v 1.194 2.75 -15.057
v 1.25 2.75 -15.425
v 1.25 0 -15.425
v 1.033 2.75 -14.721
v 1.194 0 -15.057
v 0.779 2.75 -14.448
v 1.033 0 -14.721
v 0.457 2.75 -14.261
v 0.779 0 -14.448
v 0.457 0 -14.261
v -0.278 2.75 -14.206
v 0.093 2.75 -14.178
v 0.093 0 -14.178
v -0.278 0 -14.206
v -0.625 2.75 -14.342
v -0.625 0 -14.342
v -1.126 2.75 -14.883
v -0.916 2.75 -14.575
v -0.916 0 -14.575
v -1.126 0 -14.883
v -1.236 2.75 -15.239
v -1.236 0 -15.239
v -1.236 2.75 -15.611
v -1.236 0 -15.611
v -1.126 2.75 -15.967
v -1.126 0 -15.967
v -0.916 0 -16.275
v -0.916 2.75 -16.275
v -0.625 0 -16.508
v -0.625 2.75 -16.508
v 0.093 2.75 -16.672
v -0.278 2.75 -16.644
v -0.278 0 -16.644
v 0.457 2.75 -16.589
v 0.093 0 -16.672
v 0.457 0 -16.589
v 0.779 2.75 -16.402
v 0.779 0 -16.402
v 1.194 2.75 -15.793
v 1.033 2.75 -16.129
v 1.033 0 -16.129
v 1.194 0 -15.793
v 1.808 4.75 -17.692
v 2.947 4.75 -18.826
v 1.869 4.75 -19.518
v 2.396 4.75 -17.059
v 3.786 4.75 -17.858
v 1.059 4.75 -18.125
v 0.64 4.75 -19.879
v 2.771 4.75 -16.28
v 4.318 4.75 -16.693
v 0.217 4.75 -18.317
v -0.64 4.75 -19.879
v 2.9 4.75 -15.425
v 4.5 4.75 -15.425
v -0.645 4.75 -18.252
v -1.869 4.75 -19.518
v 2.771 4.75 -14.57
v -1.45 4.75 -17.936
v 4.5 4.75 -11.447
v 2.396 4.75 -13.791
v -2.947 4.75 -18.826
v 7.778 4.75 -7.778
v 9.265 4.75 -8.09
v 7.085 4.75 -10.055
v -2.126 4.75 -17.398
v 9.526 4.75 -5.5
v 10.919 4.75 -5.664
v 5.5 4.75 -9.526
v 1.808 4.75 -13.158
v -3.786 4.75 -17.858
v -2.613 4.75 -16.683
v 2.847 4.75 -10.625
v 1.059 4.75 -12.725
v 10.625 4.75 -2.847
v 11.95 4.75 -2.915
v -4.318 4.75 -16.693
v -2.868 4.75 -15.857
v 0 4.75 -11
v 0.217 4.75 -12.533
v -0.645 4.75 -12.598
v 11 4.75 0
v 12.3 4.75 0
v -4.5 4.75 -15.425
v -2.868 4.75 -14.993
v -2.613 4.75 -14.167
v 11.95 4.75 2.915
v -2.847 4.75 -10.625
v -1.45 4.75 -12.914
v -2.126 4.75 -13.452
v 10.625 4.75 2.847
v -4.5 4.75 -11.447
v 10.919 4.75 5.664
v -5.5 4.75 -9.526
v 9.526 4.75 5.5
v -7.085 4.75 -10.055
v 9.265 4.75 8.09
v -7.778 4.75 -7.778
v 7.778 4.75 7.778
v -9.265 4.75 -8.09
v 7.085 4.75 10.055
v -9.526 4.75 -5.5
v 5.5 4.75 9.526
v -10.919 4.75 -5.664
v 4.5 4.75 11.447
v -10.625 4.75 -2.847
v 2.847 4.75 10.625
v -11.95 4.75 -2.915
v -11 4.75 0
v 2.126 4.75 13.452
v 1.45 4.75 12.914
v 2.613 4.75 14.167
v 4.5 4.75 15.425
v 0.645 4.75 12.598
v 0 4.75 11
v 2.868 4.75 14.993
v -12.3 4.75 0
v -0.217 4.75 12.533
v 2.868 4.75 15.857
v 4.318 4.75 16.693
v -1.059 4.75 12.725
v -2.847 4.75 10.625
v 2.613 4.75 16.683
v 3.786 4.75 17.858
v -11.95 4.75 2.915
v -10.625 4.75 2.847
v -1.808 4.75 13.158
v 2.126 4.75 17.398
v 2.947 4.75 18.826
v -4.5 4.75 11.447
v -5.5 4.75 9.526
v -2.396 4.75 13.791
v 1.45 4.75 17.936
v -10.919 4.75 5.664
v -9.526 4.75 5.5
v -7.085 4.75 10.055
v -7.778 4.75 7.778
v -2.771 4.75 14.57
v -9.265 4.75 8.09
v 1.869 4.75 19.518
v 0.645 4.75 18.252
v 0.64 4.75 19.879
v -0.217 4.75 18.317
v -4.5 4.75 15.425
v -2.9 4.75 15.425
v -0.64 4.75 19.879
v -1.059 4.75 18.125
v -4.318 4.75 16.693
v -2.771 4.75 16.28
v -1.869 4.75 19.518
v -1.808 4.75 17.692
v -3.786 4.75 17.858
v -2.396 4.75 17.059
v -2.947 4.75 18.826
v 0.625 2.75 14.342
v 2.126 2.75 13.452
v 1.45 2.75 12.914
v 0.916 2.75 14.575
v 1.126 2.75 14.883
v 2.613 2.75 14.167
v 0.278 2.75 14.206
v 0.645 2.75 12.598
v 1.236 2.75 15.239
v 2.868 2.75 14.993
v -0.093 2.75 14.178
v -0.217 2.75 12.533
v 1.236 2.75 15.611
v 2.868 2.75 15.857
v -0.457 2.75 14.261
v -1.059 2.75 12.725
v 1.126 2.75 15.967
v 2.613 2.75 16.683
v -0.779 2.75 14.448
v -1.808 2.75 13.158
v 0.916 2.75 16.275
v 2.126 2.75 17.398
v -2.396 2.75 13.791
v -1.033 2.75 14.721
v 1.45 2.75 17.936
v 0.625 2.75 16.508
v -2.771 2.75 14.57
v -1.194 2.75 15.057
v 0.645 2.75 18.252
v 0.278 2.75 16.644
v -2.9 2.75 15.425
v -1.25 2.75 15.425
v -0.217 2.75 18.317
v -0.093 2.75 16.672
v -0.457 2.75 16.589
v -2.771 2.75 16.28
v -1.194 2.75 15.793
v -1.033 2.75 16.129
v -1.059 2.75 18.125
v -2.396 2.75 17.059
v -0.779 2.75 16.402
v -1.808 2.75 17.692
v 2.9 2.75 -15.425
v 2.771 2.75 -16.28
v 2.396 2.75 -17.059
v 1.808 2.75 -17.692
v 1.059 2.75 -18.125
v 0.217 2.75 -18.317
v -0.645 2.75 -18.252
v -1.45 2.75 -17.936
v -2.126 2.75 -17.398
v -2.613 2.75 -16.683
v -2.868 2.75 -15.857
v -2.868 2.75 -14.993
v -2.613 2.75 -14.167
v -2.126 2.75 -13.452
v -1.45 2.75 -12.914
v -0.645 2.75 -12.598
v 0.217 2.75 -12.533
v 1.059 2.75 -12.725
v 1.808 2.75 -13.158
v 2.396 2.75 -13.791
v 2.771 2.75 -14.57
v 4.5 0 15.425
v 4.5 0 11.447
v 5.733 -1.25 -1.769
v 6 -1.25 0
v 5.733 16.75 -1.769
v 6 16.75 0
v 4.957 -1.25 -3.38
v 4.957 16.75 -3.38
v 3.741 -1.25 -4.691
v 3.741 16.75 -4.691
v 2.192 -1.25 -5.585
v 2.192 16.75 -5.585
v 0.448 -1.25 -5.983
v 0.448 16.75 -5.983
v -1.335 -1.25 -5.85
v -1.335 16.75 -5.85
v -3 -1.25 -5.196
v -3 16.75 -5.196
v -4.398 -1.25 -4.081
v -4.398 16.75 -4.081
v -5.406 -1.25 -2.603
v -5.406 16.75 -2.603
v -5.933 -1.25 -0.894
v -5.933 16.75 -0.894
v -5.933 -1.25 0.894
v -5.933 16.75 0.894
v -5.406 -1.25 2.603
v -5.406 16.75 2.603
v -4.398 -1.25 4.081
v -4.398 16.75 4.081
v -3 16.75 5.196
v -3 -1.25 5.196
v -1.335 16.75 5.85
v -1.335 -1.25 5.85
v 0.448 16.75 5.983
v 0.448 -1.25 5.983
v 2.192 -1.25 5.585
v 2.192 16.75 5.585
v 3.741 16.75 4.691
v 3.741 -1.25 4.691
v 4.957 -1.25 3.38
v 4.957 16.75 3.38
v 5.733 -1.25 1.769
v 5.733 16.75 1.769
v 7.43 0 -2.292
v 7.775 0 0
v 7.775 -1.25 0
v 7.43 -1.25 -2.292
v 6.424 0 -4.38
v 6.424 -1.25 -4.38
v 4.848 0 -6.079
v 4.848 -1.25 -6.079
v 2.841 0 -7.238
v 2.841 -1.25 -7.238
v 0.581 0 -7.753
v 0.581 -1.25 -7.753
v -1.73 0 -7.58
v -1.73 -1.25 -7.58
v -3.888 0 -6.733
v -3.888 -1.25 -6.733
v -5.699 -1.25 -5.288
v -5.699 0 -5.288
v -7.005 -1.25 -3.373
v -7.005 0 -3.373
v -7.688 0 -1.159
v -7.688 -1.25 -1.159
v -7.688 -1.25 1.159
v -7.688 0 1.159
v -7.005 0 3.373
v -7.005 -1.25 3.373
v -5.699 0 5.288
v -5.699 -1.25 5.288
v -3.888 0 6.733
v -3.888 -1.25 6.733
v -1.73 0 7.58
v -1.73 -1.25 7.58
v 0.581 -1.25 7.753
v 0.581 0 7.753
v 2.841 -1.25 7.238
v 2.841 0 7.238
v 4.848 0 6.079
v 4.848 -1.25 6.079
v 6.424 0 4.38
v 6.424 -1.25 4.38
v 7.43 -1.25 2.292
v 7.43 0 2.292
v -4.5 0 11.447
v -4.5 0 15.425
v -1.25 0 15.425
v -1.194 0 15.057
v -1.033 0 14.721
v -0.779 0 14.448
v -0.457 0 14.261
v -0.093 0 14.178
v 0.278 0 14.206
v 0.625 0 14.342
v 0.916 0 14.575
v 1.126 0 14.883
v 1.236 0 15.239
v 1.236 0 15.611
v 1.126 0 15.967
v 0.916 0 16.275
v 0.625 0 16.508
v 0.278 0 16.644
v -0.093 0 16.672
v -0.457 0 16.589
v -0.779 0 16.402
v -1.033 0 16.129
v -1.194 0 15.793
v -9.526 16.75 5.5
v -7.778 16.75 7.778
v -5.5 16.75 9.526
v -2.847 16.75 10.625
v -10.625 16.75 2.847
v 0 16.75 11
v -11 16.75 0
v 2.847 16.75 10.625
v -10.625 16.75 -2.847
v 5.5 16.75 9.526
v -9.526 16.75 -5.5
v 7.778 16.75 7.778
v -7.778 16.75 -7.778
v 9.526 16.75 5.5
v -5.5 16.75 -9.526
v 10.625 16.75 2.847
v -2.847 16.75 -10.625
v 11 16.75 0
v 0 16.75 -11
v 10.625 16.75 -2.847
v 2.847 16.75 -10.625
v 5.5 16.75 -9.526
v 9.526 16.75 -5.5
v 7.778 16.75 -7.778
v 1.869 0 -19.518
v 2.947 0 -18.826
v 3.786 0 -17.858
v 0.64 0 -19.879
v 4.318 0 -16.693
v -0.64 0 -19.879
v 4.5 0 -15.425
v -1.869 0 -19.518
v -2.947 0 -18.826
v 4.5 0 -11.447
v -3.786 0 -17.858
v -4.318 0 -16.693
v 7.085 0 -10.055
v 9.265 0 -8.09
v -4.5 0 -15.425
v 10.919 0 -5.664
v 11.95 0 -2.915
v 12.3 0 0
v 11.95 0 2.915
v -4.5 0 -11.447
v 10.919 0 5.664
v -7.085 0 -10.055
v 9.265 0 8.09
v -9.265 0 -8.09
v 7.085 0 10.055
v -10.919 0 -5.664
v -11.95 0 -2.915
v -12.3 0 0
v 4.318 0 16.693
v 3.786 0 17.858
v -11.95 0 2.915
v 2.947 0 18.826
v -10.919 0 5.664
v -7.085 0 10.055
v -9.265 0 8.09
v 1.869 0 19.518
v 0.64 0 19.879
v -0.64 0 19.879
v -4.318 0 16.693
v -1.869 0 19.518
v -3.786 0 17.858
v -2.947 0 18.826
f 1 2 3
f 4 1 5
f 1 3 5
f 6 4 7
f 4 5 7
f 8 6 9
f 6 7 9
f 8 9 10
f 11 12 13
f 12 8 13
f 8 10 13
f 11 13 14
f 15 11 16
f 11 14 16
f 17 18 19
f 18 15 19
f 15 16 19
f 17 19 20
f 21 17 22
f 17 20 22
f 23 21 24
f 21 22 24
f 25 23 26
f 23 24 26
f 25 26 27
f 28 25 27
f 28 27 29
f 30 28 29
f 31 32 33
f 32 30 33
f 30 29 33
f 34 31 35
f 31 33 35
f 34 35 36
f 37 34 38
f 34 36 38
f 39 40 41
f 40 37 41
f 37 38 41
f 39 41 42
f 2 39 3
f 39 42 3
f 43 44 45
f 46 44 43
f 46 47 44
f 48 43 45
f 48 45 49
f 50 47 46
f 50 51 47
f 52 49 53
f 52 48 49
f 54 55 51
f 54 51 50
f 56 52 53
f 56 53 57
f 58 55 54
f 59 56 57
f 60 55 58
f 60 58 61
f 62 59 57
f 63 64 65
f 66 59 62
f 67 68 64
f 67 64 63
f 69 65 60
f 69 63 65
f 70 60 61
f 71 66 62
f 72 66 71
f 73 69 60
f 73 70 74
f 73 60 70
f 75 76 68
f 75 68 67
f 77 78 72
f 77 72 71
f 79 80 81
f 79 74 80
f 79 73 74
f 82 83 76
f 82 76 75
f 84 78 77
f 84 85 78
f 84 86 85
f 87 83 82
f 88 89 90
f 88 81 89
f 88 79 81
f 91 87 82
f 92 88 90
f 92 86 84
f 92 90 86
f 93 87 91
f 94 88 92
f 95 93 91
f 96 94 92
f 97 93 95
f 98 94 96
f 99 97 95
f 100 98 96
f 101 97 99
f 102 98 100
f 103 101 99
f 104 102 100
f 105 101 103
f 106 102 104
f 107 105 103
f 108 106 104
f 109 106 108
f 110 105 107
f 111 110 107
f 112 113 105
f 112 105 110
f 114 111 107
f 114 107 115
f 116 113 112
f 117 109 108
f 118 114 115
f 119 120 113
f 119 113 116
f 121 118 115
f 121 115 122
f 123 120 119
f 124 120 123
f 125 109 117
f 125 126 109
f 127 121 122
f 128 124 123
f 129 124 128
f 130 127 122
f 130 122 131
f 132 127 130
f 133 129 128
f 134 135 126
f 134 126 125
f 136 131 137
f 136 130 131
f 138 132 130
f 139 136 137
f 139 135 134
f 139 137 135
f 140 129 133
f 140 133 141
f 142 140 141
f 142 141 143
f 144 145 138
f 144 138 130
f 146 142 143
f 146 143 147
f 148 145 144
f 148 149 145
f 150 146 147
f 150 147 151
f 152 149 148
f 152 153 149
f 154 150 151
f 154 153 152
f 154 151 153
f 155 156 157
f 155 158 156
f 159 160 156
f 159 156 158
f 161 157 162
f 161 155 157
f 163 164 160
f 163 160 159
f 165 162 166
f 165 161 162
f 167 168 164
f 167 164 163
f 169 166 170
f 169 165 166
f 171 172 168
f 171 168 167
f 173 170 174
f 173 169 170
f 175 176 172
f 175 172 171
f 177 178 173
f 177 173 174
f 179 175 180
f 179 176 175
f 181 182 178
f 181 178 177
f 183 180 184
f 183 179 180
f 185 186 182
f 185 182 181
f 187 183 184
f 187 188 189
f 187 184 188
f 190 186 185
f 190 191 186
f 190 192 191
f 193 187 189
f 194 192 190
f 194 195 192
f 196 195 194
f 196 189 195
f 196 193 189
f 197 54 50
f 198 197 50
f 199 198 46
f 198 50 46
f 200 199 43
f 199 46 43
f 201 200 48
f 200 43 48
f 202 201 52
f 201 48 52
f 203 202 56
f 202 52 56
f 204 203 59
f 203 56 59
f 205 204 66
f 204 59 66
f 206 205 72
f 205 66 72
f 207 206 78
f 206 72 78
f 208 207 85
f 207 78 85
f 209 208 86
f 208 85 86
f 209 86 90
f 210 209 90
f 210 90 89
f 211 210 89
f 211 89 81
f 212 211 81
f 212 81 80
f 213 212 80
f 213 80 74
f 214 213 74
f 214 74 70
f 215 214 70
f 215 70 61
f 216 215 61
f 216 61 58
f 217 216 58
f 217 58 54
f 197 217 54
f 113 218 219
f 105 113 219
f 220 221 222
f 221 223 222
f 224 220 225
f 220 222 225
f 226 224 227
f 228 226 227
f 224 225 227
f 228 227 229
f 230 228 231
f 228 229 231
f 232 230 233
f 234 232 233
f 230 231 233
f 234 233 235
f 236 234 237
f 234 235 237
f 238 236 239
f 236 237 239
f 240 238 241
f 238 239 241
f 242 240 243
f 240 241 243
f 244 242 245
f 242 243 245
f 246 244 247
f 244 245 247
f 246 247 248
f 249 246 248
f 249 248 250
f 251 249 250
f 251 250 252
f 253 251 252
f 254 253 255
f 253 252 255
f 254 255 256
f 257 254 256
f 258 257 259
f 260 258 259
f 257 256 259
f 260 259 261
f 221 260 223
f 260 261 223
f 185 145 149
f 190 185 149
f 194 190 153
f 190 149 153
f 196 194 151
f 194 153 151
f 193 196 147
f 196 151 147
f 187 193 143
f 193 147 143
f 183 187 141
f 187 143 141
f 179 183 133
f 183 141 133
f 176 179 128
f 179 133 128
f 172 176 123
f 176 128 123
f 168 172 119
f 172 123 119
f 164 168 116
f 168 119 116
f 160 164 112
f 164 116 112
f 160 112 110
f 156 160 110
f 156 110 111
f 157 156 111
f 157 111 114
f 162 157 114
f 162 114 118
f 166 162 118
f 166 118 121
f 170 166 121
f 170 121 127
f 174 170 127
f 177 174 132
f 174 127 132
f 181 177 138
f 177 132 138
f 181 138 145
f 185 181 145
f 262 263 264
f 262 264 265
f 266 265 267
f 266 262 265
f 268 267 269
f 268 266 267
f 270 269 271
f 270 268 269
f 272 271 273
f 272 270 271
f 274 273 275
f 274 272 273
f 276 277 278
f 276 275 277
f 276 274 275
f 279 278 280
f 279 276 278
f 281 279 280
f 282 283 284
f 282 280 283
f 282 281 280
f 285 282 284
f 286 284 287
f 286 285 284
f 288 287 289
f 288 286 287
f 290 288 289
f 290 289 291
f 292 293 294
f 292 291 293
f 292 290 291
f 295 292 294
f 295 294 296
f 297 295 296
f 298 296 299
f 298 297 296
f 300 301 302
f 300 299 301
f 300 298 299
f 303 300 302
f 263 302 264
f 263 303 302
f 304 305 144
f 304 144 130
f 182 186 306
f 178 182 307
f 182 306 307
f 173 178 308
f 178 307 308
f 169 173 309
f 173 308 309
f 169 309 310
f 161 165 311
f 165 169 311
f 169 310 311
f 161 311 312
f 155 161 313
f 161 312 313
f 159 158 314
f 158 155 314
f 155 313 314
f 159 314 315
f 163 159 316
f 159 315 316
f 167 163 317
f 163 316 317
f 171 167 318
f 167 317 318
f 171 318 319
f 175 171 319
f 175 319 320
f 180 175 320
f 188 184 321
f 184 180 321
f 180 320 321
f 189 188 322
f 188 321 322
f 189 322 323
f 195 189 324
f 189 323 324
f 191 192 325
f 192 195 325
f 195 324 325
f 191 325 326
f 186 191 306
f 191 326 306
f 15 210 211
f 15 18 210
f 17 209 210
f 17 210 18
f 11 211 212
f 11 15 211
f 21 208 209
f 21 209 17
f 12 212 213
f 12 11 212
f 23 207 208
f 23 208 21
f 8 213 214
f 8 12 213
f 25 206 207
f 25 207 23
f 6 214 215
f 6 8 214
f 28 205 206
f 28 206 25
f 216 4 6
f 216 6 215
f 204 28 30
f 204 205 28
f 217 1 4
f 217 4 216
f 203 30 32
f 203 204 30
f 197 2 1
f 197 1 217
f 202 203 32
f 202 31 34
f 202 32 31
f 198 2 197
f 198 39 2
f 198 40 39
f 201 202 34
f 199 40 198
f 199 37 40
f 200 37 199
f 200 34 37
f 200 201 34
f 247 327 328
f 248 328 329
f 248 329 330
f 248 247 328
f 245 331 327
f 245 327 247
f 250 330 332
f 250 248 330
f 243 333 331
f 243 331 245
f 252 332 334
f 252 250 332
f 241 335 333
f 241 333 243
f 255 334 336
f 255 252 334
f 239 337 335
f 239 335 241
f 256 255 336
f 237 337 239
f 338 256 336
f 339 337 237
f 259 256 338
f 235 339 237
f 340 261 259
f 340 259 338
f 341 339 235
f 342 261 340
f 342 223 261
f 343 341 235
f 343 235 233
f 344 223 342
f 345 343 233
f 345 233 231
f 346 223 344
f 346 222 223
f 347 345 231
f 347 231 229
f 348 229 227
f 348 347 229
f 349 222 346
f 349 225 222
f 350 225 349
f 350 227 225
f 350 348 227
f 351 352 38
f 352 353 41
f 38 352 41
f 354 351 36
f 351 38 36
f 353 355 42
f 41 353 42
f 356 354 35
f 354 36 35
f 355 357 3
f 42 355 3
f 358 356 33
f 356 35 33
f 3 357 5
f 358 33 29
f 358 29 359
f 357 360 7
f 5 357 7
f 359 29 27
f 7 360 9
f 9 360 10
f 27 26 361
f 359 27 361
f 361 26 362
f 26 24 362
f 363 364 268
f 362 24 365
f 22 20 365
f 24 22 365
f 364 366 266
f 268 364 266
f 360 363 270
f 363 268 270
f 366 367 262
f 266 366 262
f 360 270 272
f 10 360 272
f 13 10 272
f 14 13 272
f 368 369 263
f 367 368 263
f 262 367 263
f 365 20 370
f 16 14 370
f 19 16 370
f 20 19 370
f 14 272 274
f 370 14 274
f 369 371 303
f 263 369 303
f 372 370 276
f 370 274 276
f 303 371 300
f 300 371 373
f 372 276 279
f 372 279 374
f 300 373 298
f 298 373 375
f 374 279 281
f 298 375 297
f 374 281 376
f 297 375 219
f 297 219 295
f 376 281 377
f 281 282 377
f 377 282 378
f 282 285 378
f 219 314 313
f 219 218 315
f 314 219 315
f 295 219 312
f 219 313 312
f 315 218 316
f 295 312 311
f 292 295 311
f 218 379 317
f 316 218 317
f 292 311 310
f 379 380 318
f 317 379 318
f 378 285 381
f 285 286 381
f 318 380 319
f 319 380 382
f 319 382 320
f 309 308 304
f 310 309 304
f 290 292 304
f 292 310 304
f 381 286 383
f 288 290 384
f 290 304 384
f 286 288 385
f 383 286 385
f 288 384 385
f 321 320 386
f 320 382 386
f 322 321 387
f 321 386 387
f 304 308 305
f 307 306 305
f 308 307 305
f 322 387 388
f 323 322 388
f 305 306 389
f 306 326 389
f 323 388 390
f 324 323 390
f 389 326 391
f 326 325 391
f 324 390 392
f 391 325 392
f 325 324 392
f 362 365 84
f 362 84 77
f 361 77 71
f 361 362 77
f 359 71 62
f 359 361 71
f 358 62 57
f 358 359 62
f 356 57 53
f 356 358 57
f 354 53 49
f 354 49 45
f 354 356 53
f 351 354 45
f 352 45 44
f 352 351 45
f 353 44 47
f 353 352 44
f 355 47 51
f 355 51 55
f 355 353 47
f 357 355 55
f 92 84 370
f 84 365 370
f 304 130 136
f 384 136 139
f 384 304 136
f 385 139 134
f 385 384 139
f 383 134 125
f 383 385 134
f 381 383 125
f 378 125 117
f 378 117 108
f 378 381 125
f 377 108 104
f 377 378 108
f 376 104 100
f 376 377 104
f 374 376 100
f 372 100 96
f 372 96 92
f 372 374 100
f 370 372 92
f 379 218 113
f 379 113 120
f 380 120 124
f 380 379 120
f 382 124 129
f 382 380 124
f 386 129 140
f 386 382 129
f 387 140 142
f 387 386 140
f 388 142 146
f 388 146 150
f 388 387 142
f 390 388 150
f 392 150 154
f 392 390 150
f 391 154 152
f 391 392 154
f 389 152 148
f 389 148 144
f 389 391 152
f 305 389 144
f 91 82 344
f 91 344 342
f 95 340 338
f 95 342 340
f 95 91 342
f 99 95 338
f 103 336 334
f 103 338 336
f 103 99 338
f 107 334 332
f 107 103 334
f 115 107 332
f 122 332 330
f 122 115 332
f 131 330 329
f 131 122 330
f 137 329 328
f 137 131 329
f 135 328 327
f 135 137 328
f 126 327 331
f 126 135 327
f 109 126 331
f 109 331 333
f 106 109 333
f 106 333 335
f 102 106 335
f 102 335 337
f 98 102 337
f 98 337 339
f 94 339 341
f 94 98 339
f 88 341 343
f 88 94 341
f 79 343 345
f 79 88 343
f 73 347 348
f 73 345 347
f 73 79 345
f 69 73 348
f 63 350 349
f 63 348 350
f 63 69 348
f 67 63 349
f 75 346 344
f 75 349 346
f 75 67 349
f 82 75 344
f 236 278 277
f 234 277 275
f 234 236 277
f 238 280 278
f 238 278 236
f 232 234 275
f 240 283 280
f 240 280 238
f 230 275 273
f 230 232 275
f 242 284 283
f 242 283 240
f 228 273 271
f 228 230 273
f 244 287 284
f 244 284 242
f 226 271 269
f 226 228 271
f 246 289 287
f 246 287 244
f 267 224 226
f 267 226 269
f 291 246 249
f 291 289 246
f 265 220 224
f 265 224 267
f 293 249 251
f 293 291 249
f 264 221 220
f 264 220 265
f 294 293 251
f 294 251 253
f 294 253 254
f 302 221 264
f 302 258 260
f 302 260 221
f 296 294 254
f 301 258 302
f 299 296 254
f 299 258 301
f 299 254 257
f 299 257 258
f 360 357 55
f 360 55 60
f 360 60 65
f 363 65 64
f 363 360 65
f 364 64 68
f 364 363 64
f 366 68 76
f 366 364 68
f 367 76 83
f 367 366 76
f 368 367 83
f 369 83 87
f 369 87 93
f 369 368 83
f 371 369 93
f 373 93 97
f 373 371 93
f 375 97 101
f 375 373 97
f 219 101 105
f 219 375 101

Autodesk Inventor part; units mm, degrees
ref_plane "YZ Plane" through (0, 0, 0) normal (1, 0, 0) x (0, 1, 0)
ref_plane "XZ Plane" through (0, 0, 0) normal (0, 1, 0) x (-1, 0, 0)
ref_plane "XY Plane" through (0, 0, 0) normal (0, 0, 1) x (1, 0, 0)
sketch "Esboço1" plane through (0, 0, 0) normal (0, 1, 0) x (-1, 0, 0)
  circle A0 centre (0, 0) radius 12.3
  dimension "d0" = 24.6
extrude "Extrusão1" add sketch "Esboço1" along normal blind 4.75
sketch "Esboço2" plane through (0, 0, 0) normal (0, -1, 0) x (1, 0, 0)
  circle A0 centre (0, 0) radius 7.775
  dimension "d3" = 15.55
extrude "Extrusão2" add sketch "Esboço2" along normal blind 1.25
sketch "Esboço3" plane through (0, 0, 0) normal (0, -1, 0) x (1, 0, 0)
  circle A0 centre (0, 0) radius 12.3 projected
  circle A1 centre (0, -15.425) radius 1.25
  line L0 (-4.5, -15.425) -> (-4.5, -11.4473)
  line L1 (4.5, -15.425) -> (4.5, -11.4473)
  line L2 (4.5, -15.425) -> (8.4777, -15.425) construction
  arc A2 (-4.5, -15.425) -> (4.5, -15.425) centre (0, -15.425) ccw
  dimension "d12" = 90
extrude "Extrusão3" add sketch "Esboço3" against normal blind 4.75 contours A0 L1 A2 L0
sketch "Esboço4" plane through (0, 4.75, 0) normal (0, 1, 0) x (1, 0, 0)
  circle A0 centre (0, 15.425) radius 1.25 projected
  circle A1 centre (0, 15.425) radius 2.9
  point P0 (0, 0)
  dimension "d15" = 5.8
extrude "Extrusão4" cut sketch "Esboço4" against normal blind 2
pattern_circular "Padrão circular1" count 2 over 360 about axis through (0, 0, 0) along (0, 1, 0) of "Extrusão3", "Extrusão4"
sketch "Esboço5" plane through (0, 4.75, 0) normal (0, 1, 0) x (1, 0, 0)
  circle A0 centre (0, 0) radius 11
  dimension "d21" = 22
extrude "Extrusão5" add sketch "Esboço5" along normal blind 12
sketch "Esboço6" plane through (0, 16.75, 0) normal (0, 1, 0) x (1, 0, 0)
  circle A0 centre (0, 0) radius 6
  dimension "d24" = 12
extrude "Extrusão6" cut sketch "Esboço6" against normal blind 20
thread "Rosca1" size "M22x3" class "6g" standard "ANSI Metric M Profile" full length
sketch "Esboço7" plane through (0, 0, 0) normal (0, -1, 0) x (1, 0, 0)
  circle A0 centre (0, -15.425) radius 1.25 projected
  circle A1 centre (0, -15.425) radius 1.5
  circle A2 centre (0, 15.425) radius 1.25 projected
  circle A3 centre (0, 15.425) radius 1.5
  circle A4 centre (0, 0) radius 8
  line L0 (-14, 21.425) -> (14, 21.425)
  line L1 (14, 21.425) -> (14, -21.425)
  line L2 (14, -21.425) -> (-14, -21.425)
  line L3 (-14, -21.425) -> (-14, 21.425)
  dimension "d29" = 3
  dimension "d30" = 3
  dimension "d31" = 16
properties part number "prensa_cabo_fixador"
